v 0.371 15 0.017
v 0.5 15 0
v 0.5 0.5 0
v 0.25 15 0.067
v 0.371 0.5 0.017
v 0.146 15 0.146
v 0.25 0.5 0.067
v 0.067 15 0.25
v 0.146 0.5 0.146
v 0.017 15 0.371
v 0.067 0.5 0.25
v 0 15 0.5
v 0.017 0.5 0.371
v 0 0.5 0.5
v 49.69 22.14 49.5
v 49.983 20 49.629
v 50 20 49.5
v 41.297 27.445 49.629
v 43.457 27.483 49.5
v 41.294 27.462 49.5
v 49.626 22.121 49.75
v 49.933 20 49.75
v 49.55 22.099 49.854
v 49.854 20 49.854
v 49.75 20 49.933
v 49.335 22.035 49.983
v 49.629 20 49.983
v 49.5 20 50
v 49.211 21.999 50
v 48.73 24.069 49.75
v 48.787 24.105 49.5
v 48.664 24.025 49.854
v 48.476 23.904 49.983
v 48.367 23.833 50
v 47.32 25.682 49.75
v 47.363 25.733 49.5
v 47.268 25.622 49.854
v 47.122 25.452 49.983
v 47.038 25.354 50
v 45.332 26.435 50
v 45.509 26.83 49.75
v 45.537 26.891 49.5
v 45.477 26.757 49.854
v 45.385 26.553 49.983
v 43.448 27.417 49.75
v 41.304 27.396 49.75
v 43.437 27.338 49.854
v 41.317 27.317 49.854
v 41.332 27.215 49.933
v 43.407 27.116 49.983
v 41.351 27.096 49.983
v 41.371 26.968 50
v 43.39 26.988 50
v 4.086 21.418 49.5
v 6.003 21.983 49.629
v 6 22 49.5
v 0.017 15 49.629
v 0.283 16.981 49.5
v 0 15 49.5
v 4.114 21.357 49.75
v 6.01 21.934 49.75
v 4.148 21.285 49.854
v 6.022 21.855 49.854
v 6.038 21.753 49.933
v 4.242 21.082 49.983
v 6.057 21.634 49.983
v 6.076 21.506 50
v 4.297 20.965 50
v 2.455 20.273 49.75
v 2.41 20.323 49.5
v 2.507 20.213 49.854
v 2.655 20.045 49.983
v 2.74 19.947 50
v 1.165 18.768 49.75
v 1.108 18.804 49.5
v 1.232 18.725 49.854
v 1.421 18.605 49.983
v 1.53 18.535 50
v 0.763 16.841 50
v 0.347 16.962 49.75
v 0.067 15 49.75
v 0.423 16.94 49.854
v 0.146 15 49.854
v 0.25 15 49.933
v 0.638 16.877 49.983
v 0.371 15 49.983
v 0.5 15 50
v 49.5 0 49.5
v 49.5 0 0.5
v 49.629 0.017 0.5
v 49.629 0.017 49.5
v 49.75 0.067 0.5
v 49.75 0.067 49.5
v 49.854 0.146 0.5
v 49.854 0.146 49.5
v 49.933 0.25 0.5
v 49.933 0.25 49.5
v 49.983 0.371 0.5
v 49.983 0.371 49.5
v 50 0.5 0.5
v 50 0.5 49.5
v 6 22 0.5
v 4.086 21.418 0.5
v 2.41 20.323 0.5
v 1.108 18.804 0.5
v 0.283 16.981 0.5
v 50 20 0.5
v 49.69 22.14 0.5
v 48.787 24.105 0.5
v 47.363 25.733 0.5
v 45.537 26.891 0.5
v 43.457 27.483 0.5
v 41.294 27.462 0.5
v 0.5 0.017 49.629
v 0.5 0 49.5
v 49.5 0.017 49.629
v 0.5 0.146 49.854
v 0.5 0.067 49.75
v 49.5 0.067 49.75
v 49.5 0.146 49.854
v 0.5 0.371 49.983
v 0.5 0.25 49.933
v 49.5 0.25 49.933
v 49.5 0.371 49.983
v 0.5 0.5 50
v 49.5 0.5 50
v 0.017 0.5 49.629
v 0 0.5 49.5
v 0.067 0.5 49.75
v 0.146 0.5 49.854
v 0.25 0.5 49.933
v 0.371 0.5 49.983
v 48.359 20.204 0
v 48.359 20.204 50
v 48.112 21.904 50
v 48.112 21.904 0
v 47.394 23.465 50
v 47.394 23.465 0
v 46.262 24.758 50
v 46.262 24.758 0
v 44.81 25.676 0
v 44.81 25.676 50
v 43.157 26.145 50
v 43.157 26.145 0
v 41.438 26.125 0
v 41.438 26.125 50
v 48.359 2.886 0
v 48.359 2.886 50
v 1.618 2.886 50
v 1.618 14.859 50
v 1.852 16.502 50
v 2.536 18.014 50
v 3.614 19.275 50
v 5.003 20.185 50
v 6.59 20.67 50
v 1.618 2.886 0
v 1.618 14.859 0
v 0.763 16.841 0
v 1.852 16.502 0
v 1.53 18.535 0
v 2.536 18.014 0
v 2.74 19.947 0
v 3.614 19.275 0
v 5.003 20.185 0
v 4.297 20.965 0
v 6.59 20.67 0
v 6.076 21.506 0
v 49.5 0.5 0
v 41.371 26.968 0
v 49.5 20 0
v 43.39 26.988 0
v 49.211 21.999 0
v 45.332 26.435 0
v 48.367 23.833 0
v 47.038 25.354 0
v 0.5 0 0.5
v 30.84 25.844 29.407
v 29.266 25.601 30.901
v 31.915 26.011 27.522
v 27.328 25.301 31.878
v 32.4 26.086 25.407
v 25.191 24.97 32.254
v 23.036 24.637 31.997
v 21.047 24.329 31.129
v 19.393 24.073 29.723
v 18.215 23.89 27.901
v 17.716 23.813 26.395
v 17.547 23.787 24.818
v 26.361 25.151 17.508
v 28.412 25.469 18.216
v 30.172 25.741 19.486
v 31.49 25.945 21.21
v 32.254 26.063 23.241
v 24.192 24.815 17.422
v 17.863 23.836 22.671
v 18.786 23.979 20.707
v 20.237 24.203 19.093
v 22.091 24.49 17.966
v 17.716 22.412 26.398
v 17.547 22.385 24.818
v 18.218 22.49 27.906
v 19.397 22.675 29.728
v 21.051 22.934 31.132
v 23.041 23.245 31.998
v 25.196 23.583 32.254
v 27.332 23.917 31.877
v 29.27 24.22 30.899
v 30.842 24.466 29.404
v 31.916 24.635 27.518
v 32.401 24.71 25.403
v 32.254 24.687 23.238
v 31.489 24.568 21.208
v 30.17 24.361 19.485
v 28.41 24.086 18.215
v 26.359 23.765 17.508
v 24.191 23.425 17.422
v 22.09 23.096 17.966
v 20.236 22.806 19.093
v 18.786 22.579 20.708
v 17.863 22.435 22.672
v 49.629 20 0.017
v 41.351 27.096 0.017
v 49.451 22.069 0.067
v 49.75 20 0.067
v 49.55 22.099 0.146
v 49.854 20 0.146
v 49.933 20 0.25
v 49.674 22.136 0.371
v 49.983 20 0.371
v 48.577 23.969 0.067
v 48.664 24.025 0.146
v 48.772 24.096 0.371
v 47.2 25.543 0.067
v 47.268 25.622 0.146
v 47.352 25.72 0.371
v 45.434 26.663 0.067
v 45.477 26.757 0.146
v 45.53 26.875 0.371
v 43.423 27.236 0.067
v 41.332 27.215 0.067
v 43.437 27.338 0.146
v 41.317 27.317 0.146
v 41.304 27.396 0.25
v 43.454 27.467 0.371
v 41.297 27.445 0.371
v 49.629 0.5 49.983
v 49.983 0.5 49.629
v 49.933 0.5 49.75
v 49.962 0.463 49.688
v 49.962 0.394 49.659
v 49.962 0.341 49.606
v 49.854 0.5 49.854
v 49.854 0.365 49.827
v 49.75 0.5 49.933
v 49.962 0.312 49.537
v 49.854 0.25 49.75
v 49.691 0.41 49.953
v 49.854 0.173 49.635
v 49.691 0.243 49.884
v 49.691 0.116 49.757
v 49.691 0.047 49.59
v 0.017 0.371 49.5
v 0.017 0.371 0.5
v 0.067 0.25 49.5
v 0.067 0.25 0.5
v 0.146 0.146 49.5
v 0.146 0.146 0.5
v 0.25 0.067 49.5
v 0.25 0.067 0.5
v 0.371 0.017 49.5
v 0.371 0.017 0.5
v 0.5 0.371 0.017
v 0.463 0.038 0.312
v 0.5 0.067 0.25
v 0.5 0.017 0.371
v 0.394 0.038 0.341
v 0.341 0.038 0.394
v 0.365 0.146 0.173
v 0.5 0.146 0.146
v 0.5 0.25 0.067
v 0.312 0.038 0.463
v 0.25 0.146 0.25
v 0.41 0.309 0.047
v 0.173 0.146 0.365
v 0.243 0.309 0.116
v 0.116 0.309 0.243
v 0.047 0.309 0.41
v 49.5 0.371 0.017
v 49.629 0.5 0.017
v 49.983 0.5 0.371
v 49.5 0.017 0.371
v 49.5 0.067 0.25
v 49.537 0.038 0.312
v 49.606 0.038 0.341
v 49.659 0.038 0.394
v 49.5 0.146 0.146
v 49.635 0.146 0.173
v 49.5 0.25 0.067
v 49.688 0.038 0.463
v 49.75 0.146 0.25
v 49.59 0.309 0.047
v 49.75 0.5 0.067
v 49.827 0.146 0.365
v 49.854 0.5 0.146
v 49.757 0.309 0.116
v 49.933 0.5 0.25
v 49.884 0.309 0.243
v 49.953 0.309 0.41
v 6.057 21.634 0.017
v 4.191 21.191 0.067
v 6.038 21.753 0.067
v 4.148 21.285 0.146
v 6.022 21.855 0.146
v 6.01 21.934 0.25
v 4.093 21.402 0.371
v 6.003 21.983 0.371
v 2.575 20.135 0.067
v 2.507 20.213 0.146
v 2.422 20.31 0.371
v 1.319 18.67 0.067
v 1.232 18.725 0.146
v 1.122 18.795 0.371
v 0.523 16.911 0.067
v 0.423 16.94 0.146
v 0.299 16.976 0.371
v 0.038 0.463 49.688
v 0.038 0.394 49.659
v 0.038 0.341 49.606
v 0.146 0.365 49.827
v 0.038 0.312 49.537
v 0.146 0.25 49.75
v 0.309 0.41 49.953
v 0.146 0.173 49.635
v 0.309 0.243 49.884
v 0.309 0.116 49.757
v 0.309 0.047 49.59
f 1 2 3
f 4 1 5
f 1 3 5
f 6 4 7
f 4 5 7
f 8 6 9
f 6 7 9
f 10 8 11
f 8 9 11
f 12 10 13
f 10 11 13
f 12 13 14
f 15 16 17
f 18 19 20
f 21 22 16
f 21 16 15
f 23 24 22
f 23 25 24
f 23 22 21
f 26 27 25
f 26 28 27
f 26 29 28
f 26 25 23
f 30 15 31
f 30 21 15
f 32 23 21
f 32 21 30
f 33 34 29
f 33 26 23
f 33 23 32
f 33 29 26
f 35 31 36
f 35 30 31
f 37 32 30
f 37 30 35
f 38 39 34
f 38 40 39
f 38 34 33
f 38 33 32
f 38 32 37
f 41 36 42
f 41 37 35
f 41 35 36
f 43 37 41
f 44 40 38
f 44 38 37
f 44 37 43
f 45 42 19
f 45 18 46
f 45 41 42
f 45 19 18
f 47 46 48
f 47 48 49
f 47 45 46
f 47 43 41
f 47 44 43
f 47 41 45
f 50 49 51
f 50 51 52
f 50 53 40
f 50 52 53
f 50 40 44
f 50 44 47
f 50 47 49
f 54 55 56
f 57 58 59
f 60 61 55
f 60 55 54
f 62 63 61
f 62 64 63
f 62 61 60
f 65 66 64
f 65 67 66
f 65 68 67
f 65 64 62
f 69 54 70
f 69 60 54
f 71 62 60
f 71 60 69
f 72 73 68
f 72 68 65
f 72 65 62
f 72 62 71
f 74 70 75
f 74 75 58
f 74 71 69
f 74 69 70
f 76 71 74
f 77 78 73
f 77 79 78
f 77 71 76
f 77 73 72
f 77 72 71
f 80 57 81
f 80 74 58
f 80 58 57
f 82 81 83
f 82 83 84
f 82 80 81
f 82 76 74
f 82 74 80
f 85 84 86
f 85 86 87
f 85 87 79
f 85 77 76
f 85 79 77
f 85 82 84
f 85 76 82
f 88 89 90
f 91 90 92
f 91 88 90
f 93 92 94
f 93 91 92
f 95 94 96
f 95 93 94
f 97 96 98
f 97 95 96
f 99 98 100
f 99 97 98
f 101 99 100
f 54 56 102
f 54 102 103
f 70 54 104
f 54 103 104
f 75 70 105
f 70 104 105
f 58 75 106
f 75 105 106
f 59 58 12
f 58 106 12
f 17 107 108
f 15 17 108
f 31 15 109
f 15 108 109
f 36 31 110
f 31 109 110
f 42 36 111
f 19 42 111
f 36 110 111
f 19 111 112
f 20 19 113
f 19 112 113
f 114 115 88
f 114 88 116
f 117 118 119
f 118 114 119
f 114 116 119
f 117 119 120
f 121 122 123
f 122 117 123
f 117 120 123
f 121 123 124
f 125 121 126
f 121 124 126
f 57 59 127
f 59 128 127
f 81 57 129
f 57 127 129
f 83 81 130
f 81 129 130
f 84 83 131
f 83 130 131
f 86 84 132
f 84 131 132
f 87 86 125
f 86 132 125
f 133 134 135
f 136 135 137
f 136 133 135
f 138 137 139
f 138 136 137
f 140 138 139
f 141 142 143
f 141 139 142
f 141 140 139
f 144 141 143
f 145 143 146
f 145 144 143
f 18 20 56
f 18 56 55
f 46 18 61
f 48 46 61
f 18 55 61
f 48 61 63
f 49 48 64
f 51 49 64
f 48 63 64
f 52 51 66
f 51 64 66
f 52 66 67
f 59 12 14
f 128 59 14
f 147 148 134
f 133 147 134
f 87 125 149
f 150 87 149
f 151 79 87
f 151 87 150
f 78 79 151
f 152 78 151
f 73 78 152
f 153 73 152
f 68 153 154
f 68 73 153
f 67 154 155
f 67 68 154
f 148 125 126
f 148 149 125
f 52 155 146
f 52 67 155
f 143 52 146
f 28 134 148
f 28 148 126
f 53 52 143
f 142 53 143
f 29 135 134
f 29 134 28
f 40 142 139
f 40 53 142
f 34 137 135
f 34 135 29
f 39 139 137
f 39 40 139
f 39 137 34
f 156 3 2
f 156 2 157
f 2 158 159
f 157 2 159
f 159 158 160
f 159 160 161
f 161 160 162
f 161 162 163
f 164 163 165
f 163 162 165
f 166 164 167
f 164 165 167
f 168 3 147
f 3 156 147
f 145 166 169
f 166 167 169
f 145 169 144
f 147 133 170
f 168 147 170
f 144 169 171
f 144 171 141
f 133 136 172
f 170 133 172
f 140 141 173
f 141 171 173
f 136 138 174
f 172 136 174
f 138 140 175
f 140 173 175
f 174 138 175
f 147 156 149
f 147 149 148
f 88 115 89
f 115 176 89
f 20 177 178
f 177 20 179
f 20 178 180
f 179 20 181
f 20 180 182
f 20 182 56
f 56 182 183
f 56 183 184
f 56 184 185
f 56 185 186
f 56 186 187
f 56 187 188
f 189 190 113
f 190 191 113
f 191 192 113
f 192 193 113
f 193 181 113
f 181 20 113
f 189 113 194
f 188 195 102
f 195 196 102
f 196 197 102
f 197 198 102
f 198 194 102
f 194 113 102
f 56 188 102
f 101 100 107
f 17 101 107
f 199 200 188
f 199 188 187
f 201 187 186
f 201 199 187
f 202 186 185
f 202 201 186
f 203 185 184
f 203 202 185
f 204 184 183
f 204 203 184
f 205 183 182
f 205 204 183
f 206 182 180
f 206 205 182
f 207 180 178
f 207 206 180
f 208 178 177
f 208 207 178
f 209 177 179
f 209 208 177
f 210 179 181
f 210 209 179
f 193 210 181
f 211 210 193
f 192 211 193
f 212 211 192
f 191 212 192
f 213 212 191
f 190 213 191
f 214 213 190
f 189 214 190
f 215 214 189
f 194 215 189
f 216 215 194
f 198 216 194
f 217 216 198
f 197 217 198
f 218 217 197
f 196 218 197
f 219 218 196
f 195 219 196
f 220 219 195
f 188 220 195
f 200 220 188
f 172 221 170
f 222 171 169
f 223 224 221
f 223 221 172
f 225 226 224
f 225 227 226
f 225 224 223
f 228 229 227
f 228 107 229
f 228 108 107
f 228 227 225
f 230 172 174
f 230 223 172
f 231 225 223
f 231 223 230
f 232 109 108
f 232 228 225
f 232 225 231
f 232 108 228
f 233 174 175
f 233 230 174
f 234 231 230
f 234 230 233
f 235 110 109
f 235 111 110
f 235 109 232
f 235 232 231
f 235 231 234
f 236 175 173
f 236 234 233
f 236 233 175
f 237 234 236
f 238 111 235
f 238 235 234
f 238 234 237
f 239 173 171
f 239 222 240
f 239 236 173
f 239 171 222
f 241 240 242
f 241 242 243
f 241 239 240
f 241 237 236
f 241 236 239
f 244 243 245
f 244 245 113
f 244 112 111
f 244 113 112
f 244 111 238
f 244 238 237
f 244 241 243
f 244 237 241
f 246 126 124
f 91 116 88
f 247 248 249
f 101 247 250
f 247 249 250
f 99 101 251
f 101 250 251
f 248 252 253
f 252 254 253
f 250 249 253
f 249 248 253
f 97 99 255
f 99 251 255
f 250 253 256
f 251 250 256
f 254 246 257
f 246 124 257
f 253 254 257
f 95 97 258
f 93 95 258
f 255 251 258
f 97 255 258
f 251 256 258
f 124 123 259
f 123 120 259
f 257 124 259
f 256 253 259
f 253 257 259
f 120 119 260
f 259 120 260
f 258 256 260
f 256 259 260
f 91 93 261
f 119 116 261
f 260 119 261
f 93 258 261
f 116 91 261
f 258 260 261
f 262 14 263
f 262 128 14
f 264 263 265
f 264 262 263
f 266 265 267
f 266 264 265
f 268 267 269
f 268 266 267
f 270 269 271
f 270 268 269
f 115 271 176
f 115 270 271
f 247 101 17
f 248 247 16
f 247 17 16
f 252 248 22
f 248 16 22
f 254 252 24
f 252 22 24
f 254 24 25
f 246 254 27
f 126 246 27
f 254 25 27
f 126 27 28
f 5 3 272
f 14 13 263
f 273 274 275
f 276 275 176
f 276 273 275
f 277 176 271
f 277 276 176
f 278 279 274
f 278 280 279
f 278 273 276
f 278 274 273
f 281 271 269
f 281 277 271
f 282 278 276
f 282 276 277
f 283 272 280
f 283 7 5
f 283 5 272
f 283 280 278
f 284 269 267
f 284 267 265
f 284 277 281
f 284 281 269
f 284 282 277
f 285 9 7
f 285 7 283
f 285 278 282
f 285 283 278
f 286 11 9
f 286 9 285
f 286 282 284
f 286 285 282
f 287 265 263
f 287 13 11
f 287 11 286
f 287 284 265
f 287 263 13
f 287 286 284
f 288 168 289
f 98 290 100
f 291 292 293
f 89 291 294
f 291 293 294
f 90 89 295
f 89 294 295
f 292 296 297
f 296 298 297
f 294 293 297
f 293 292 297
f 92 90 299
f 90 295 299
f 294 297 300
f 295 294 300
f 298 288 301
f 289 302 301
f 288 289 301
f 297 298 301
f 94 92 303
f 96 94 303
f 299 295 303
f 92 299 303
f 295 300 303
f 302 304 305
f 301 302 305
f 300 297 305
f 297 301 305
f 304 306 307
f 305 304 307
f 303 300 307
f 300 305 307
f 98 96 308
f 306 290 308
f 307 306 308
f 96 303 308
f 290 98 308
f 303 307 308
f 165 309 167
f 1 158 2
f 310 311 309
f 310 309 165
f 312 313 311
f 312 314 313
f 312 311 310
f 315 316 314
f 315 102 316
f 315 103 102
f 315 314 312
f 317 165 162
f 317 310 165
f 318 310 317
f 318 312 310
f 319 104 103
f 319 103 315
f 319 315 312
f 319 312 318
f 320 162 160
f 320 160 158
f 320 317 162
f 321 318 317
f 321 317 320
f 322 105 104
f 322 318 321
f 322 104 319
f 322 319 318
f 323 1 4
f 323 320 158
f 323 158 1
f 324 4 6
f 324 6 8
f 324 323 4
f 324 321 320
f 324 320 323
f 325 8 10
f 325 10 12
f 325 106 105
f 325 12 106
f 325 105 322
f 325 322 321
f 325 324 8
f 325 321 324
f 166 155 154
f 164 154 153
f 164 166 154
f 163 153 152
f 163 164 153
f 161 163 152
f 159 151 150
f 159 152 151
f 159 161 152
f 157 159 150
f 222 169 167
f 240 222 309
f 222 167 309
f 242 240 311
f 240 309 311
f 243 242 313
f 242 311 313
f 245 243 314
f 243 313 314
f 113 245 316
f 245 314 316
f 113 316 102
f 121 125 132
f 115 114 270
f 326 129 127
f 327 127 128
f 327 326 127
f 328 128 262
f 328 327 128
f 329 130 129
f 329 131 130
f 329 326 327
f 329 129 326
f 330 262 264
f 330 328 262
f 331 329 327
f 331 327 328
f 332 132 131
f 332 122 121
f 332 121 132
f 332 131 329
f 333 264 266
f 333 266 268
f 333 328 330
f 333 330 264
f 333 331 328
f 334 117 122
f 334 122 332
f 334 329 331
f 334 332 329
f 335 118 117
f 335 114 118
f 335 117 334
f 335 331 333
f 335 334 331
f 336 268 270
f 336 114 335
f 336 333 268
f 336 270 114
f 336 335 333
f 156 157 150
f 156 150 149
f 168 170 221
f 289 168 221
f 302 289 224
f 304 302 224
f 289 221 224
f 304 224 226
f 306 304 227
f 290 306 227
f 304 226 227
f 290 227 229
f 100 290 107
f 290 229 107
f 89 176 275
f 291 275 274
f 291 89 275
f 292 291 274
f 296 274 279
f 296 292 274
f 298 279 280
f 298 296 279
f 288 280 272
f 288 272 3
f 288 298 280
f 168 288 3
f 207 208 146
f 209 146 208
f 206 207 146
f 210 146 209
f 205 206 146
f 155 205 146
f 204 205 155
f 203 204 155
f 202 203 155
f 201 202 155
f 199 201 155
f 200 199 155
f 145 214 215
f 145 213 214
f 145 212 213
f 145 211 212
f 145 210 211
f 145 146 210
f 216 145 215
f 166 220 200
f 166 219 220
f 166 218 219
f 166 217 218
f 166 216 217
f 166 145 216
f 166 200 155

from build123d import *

# Parameters (mm, degrees)
PAD_DEPTH       = 50
POCKET_DEPTH    = 50.001
FILLET_R        = 0.5
SKETCH003_R     = 7.438429
POCKET001_DEPTH = 24.66558


with BuildPart() as part:
    # Sketch → Pad (new body)
    with BuildSketch(Plane.XY):
        with BuildLine():
            Line((0, 15), (0, 0))
            Line((0, 0), (50, 0))
            Line((50, 0), (50, 20))
            ThreePointArc((50, 20), (47.363119, 25.733162), (41.294118, 27.462185))
            Line((41.294118, 27.462185), (6, 22))
            ThreePointArc((6, 22), (1.705266, 19.609772), (0, 15))
        make_face()
    extrude(amount=PAD_DEPTH)

    # Sketch002 → Pocket (cut, through all)
    with BuildSketch(Plane.XY):
        with BuildLine():
            Line((1.617649, 14.859023), (1.617649, 2.886441))
            Line((1.617649, 2.886441), (48.358659, 2.886441))
            Line((48.358659, 2.886441), (48.358659, 20.203976))
            ThreePointArc((48.358659, 20.203976), (46.261778, 24.757846), (41.4384, 26.125203))
            Line((41.4384, 26.125203), (6.589663, 20.669917))
            ThreePointArc((6.589663, 20.669917), (3.030296, 18.682876), (1.617649, 14.859023))
        make_face()
    extrude(amount=POCKET_DEPTH, mode=Mode.SUBTRACT)

    # Fillet
    fillet_edges = [part.edges().sort_by_distance(p)[0] for p in [
        (25, 0, 50),
        (0, 7.5, 50),
        (1.705266, 19.609772, 50),
        (23.647059, 24.731092, 50),
        (47.363119, 25.733162, 50),
        (50, 10, 50),
        (50, 10, 0),
        (25, 0, 0),
        (50, 0, 25),
        (0, 0, 25),
    ]]
    fillet(fillet_edges, radius=FILLET_R)

    # Sketch003 (on Face21 of Fillet) → Pocket001 (cut, through all)
    with BuildSketch(Plane(origin=(0, 2.886441, 0), x_dir=(-1, 0, 0), z_dir=(0, 1, 0))):
        with Locations((-24.985147, 24.818342)):
            Circle(SKETCH003_R)
    extrude(amount=POCKET001_DEPTH, mode=Mode.SUBTRACT)


solid = part.part
